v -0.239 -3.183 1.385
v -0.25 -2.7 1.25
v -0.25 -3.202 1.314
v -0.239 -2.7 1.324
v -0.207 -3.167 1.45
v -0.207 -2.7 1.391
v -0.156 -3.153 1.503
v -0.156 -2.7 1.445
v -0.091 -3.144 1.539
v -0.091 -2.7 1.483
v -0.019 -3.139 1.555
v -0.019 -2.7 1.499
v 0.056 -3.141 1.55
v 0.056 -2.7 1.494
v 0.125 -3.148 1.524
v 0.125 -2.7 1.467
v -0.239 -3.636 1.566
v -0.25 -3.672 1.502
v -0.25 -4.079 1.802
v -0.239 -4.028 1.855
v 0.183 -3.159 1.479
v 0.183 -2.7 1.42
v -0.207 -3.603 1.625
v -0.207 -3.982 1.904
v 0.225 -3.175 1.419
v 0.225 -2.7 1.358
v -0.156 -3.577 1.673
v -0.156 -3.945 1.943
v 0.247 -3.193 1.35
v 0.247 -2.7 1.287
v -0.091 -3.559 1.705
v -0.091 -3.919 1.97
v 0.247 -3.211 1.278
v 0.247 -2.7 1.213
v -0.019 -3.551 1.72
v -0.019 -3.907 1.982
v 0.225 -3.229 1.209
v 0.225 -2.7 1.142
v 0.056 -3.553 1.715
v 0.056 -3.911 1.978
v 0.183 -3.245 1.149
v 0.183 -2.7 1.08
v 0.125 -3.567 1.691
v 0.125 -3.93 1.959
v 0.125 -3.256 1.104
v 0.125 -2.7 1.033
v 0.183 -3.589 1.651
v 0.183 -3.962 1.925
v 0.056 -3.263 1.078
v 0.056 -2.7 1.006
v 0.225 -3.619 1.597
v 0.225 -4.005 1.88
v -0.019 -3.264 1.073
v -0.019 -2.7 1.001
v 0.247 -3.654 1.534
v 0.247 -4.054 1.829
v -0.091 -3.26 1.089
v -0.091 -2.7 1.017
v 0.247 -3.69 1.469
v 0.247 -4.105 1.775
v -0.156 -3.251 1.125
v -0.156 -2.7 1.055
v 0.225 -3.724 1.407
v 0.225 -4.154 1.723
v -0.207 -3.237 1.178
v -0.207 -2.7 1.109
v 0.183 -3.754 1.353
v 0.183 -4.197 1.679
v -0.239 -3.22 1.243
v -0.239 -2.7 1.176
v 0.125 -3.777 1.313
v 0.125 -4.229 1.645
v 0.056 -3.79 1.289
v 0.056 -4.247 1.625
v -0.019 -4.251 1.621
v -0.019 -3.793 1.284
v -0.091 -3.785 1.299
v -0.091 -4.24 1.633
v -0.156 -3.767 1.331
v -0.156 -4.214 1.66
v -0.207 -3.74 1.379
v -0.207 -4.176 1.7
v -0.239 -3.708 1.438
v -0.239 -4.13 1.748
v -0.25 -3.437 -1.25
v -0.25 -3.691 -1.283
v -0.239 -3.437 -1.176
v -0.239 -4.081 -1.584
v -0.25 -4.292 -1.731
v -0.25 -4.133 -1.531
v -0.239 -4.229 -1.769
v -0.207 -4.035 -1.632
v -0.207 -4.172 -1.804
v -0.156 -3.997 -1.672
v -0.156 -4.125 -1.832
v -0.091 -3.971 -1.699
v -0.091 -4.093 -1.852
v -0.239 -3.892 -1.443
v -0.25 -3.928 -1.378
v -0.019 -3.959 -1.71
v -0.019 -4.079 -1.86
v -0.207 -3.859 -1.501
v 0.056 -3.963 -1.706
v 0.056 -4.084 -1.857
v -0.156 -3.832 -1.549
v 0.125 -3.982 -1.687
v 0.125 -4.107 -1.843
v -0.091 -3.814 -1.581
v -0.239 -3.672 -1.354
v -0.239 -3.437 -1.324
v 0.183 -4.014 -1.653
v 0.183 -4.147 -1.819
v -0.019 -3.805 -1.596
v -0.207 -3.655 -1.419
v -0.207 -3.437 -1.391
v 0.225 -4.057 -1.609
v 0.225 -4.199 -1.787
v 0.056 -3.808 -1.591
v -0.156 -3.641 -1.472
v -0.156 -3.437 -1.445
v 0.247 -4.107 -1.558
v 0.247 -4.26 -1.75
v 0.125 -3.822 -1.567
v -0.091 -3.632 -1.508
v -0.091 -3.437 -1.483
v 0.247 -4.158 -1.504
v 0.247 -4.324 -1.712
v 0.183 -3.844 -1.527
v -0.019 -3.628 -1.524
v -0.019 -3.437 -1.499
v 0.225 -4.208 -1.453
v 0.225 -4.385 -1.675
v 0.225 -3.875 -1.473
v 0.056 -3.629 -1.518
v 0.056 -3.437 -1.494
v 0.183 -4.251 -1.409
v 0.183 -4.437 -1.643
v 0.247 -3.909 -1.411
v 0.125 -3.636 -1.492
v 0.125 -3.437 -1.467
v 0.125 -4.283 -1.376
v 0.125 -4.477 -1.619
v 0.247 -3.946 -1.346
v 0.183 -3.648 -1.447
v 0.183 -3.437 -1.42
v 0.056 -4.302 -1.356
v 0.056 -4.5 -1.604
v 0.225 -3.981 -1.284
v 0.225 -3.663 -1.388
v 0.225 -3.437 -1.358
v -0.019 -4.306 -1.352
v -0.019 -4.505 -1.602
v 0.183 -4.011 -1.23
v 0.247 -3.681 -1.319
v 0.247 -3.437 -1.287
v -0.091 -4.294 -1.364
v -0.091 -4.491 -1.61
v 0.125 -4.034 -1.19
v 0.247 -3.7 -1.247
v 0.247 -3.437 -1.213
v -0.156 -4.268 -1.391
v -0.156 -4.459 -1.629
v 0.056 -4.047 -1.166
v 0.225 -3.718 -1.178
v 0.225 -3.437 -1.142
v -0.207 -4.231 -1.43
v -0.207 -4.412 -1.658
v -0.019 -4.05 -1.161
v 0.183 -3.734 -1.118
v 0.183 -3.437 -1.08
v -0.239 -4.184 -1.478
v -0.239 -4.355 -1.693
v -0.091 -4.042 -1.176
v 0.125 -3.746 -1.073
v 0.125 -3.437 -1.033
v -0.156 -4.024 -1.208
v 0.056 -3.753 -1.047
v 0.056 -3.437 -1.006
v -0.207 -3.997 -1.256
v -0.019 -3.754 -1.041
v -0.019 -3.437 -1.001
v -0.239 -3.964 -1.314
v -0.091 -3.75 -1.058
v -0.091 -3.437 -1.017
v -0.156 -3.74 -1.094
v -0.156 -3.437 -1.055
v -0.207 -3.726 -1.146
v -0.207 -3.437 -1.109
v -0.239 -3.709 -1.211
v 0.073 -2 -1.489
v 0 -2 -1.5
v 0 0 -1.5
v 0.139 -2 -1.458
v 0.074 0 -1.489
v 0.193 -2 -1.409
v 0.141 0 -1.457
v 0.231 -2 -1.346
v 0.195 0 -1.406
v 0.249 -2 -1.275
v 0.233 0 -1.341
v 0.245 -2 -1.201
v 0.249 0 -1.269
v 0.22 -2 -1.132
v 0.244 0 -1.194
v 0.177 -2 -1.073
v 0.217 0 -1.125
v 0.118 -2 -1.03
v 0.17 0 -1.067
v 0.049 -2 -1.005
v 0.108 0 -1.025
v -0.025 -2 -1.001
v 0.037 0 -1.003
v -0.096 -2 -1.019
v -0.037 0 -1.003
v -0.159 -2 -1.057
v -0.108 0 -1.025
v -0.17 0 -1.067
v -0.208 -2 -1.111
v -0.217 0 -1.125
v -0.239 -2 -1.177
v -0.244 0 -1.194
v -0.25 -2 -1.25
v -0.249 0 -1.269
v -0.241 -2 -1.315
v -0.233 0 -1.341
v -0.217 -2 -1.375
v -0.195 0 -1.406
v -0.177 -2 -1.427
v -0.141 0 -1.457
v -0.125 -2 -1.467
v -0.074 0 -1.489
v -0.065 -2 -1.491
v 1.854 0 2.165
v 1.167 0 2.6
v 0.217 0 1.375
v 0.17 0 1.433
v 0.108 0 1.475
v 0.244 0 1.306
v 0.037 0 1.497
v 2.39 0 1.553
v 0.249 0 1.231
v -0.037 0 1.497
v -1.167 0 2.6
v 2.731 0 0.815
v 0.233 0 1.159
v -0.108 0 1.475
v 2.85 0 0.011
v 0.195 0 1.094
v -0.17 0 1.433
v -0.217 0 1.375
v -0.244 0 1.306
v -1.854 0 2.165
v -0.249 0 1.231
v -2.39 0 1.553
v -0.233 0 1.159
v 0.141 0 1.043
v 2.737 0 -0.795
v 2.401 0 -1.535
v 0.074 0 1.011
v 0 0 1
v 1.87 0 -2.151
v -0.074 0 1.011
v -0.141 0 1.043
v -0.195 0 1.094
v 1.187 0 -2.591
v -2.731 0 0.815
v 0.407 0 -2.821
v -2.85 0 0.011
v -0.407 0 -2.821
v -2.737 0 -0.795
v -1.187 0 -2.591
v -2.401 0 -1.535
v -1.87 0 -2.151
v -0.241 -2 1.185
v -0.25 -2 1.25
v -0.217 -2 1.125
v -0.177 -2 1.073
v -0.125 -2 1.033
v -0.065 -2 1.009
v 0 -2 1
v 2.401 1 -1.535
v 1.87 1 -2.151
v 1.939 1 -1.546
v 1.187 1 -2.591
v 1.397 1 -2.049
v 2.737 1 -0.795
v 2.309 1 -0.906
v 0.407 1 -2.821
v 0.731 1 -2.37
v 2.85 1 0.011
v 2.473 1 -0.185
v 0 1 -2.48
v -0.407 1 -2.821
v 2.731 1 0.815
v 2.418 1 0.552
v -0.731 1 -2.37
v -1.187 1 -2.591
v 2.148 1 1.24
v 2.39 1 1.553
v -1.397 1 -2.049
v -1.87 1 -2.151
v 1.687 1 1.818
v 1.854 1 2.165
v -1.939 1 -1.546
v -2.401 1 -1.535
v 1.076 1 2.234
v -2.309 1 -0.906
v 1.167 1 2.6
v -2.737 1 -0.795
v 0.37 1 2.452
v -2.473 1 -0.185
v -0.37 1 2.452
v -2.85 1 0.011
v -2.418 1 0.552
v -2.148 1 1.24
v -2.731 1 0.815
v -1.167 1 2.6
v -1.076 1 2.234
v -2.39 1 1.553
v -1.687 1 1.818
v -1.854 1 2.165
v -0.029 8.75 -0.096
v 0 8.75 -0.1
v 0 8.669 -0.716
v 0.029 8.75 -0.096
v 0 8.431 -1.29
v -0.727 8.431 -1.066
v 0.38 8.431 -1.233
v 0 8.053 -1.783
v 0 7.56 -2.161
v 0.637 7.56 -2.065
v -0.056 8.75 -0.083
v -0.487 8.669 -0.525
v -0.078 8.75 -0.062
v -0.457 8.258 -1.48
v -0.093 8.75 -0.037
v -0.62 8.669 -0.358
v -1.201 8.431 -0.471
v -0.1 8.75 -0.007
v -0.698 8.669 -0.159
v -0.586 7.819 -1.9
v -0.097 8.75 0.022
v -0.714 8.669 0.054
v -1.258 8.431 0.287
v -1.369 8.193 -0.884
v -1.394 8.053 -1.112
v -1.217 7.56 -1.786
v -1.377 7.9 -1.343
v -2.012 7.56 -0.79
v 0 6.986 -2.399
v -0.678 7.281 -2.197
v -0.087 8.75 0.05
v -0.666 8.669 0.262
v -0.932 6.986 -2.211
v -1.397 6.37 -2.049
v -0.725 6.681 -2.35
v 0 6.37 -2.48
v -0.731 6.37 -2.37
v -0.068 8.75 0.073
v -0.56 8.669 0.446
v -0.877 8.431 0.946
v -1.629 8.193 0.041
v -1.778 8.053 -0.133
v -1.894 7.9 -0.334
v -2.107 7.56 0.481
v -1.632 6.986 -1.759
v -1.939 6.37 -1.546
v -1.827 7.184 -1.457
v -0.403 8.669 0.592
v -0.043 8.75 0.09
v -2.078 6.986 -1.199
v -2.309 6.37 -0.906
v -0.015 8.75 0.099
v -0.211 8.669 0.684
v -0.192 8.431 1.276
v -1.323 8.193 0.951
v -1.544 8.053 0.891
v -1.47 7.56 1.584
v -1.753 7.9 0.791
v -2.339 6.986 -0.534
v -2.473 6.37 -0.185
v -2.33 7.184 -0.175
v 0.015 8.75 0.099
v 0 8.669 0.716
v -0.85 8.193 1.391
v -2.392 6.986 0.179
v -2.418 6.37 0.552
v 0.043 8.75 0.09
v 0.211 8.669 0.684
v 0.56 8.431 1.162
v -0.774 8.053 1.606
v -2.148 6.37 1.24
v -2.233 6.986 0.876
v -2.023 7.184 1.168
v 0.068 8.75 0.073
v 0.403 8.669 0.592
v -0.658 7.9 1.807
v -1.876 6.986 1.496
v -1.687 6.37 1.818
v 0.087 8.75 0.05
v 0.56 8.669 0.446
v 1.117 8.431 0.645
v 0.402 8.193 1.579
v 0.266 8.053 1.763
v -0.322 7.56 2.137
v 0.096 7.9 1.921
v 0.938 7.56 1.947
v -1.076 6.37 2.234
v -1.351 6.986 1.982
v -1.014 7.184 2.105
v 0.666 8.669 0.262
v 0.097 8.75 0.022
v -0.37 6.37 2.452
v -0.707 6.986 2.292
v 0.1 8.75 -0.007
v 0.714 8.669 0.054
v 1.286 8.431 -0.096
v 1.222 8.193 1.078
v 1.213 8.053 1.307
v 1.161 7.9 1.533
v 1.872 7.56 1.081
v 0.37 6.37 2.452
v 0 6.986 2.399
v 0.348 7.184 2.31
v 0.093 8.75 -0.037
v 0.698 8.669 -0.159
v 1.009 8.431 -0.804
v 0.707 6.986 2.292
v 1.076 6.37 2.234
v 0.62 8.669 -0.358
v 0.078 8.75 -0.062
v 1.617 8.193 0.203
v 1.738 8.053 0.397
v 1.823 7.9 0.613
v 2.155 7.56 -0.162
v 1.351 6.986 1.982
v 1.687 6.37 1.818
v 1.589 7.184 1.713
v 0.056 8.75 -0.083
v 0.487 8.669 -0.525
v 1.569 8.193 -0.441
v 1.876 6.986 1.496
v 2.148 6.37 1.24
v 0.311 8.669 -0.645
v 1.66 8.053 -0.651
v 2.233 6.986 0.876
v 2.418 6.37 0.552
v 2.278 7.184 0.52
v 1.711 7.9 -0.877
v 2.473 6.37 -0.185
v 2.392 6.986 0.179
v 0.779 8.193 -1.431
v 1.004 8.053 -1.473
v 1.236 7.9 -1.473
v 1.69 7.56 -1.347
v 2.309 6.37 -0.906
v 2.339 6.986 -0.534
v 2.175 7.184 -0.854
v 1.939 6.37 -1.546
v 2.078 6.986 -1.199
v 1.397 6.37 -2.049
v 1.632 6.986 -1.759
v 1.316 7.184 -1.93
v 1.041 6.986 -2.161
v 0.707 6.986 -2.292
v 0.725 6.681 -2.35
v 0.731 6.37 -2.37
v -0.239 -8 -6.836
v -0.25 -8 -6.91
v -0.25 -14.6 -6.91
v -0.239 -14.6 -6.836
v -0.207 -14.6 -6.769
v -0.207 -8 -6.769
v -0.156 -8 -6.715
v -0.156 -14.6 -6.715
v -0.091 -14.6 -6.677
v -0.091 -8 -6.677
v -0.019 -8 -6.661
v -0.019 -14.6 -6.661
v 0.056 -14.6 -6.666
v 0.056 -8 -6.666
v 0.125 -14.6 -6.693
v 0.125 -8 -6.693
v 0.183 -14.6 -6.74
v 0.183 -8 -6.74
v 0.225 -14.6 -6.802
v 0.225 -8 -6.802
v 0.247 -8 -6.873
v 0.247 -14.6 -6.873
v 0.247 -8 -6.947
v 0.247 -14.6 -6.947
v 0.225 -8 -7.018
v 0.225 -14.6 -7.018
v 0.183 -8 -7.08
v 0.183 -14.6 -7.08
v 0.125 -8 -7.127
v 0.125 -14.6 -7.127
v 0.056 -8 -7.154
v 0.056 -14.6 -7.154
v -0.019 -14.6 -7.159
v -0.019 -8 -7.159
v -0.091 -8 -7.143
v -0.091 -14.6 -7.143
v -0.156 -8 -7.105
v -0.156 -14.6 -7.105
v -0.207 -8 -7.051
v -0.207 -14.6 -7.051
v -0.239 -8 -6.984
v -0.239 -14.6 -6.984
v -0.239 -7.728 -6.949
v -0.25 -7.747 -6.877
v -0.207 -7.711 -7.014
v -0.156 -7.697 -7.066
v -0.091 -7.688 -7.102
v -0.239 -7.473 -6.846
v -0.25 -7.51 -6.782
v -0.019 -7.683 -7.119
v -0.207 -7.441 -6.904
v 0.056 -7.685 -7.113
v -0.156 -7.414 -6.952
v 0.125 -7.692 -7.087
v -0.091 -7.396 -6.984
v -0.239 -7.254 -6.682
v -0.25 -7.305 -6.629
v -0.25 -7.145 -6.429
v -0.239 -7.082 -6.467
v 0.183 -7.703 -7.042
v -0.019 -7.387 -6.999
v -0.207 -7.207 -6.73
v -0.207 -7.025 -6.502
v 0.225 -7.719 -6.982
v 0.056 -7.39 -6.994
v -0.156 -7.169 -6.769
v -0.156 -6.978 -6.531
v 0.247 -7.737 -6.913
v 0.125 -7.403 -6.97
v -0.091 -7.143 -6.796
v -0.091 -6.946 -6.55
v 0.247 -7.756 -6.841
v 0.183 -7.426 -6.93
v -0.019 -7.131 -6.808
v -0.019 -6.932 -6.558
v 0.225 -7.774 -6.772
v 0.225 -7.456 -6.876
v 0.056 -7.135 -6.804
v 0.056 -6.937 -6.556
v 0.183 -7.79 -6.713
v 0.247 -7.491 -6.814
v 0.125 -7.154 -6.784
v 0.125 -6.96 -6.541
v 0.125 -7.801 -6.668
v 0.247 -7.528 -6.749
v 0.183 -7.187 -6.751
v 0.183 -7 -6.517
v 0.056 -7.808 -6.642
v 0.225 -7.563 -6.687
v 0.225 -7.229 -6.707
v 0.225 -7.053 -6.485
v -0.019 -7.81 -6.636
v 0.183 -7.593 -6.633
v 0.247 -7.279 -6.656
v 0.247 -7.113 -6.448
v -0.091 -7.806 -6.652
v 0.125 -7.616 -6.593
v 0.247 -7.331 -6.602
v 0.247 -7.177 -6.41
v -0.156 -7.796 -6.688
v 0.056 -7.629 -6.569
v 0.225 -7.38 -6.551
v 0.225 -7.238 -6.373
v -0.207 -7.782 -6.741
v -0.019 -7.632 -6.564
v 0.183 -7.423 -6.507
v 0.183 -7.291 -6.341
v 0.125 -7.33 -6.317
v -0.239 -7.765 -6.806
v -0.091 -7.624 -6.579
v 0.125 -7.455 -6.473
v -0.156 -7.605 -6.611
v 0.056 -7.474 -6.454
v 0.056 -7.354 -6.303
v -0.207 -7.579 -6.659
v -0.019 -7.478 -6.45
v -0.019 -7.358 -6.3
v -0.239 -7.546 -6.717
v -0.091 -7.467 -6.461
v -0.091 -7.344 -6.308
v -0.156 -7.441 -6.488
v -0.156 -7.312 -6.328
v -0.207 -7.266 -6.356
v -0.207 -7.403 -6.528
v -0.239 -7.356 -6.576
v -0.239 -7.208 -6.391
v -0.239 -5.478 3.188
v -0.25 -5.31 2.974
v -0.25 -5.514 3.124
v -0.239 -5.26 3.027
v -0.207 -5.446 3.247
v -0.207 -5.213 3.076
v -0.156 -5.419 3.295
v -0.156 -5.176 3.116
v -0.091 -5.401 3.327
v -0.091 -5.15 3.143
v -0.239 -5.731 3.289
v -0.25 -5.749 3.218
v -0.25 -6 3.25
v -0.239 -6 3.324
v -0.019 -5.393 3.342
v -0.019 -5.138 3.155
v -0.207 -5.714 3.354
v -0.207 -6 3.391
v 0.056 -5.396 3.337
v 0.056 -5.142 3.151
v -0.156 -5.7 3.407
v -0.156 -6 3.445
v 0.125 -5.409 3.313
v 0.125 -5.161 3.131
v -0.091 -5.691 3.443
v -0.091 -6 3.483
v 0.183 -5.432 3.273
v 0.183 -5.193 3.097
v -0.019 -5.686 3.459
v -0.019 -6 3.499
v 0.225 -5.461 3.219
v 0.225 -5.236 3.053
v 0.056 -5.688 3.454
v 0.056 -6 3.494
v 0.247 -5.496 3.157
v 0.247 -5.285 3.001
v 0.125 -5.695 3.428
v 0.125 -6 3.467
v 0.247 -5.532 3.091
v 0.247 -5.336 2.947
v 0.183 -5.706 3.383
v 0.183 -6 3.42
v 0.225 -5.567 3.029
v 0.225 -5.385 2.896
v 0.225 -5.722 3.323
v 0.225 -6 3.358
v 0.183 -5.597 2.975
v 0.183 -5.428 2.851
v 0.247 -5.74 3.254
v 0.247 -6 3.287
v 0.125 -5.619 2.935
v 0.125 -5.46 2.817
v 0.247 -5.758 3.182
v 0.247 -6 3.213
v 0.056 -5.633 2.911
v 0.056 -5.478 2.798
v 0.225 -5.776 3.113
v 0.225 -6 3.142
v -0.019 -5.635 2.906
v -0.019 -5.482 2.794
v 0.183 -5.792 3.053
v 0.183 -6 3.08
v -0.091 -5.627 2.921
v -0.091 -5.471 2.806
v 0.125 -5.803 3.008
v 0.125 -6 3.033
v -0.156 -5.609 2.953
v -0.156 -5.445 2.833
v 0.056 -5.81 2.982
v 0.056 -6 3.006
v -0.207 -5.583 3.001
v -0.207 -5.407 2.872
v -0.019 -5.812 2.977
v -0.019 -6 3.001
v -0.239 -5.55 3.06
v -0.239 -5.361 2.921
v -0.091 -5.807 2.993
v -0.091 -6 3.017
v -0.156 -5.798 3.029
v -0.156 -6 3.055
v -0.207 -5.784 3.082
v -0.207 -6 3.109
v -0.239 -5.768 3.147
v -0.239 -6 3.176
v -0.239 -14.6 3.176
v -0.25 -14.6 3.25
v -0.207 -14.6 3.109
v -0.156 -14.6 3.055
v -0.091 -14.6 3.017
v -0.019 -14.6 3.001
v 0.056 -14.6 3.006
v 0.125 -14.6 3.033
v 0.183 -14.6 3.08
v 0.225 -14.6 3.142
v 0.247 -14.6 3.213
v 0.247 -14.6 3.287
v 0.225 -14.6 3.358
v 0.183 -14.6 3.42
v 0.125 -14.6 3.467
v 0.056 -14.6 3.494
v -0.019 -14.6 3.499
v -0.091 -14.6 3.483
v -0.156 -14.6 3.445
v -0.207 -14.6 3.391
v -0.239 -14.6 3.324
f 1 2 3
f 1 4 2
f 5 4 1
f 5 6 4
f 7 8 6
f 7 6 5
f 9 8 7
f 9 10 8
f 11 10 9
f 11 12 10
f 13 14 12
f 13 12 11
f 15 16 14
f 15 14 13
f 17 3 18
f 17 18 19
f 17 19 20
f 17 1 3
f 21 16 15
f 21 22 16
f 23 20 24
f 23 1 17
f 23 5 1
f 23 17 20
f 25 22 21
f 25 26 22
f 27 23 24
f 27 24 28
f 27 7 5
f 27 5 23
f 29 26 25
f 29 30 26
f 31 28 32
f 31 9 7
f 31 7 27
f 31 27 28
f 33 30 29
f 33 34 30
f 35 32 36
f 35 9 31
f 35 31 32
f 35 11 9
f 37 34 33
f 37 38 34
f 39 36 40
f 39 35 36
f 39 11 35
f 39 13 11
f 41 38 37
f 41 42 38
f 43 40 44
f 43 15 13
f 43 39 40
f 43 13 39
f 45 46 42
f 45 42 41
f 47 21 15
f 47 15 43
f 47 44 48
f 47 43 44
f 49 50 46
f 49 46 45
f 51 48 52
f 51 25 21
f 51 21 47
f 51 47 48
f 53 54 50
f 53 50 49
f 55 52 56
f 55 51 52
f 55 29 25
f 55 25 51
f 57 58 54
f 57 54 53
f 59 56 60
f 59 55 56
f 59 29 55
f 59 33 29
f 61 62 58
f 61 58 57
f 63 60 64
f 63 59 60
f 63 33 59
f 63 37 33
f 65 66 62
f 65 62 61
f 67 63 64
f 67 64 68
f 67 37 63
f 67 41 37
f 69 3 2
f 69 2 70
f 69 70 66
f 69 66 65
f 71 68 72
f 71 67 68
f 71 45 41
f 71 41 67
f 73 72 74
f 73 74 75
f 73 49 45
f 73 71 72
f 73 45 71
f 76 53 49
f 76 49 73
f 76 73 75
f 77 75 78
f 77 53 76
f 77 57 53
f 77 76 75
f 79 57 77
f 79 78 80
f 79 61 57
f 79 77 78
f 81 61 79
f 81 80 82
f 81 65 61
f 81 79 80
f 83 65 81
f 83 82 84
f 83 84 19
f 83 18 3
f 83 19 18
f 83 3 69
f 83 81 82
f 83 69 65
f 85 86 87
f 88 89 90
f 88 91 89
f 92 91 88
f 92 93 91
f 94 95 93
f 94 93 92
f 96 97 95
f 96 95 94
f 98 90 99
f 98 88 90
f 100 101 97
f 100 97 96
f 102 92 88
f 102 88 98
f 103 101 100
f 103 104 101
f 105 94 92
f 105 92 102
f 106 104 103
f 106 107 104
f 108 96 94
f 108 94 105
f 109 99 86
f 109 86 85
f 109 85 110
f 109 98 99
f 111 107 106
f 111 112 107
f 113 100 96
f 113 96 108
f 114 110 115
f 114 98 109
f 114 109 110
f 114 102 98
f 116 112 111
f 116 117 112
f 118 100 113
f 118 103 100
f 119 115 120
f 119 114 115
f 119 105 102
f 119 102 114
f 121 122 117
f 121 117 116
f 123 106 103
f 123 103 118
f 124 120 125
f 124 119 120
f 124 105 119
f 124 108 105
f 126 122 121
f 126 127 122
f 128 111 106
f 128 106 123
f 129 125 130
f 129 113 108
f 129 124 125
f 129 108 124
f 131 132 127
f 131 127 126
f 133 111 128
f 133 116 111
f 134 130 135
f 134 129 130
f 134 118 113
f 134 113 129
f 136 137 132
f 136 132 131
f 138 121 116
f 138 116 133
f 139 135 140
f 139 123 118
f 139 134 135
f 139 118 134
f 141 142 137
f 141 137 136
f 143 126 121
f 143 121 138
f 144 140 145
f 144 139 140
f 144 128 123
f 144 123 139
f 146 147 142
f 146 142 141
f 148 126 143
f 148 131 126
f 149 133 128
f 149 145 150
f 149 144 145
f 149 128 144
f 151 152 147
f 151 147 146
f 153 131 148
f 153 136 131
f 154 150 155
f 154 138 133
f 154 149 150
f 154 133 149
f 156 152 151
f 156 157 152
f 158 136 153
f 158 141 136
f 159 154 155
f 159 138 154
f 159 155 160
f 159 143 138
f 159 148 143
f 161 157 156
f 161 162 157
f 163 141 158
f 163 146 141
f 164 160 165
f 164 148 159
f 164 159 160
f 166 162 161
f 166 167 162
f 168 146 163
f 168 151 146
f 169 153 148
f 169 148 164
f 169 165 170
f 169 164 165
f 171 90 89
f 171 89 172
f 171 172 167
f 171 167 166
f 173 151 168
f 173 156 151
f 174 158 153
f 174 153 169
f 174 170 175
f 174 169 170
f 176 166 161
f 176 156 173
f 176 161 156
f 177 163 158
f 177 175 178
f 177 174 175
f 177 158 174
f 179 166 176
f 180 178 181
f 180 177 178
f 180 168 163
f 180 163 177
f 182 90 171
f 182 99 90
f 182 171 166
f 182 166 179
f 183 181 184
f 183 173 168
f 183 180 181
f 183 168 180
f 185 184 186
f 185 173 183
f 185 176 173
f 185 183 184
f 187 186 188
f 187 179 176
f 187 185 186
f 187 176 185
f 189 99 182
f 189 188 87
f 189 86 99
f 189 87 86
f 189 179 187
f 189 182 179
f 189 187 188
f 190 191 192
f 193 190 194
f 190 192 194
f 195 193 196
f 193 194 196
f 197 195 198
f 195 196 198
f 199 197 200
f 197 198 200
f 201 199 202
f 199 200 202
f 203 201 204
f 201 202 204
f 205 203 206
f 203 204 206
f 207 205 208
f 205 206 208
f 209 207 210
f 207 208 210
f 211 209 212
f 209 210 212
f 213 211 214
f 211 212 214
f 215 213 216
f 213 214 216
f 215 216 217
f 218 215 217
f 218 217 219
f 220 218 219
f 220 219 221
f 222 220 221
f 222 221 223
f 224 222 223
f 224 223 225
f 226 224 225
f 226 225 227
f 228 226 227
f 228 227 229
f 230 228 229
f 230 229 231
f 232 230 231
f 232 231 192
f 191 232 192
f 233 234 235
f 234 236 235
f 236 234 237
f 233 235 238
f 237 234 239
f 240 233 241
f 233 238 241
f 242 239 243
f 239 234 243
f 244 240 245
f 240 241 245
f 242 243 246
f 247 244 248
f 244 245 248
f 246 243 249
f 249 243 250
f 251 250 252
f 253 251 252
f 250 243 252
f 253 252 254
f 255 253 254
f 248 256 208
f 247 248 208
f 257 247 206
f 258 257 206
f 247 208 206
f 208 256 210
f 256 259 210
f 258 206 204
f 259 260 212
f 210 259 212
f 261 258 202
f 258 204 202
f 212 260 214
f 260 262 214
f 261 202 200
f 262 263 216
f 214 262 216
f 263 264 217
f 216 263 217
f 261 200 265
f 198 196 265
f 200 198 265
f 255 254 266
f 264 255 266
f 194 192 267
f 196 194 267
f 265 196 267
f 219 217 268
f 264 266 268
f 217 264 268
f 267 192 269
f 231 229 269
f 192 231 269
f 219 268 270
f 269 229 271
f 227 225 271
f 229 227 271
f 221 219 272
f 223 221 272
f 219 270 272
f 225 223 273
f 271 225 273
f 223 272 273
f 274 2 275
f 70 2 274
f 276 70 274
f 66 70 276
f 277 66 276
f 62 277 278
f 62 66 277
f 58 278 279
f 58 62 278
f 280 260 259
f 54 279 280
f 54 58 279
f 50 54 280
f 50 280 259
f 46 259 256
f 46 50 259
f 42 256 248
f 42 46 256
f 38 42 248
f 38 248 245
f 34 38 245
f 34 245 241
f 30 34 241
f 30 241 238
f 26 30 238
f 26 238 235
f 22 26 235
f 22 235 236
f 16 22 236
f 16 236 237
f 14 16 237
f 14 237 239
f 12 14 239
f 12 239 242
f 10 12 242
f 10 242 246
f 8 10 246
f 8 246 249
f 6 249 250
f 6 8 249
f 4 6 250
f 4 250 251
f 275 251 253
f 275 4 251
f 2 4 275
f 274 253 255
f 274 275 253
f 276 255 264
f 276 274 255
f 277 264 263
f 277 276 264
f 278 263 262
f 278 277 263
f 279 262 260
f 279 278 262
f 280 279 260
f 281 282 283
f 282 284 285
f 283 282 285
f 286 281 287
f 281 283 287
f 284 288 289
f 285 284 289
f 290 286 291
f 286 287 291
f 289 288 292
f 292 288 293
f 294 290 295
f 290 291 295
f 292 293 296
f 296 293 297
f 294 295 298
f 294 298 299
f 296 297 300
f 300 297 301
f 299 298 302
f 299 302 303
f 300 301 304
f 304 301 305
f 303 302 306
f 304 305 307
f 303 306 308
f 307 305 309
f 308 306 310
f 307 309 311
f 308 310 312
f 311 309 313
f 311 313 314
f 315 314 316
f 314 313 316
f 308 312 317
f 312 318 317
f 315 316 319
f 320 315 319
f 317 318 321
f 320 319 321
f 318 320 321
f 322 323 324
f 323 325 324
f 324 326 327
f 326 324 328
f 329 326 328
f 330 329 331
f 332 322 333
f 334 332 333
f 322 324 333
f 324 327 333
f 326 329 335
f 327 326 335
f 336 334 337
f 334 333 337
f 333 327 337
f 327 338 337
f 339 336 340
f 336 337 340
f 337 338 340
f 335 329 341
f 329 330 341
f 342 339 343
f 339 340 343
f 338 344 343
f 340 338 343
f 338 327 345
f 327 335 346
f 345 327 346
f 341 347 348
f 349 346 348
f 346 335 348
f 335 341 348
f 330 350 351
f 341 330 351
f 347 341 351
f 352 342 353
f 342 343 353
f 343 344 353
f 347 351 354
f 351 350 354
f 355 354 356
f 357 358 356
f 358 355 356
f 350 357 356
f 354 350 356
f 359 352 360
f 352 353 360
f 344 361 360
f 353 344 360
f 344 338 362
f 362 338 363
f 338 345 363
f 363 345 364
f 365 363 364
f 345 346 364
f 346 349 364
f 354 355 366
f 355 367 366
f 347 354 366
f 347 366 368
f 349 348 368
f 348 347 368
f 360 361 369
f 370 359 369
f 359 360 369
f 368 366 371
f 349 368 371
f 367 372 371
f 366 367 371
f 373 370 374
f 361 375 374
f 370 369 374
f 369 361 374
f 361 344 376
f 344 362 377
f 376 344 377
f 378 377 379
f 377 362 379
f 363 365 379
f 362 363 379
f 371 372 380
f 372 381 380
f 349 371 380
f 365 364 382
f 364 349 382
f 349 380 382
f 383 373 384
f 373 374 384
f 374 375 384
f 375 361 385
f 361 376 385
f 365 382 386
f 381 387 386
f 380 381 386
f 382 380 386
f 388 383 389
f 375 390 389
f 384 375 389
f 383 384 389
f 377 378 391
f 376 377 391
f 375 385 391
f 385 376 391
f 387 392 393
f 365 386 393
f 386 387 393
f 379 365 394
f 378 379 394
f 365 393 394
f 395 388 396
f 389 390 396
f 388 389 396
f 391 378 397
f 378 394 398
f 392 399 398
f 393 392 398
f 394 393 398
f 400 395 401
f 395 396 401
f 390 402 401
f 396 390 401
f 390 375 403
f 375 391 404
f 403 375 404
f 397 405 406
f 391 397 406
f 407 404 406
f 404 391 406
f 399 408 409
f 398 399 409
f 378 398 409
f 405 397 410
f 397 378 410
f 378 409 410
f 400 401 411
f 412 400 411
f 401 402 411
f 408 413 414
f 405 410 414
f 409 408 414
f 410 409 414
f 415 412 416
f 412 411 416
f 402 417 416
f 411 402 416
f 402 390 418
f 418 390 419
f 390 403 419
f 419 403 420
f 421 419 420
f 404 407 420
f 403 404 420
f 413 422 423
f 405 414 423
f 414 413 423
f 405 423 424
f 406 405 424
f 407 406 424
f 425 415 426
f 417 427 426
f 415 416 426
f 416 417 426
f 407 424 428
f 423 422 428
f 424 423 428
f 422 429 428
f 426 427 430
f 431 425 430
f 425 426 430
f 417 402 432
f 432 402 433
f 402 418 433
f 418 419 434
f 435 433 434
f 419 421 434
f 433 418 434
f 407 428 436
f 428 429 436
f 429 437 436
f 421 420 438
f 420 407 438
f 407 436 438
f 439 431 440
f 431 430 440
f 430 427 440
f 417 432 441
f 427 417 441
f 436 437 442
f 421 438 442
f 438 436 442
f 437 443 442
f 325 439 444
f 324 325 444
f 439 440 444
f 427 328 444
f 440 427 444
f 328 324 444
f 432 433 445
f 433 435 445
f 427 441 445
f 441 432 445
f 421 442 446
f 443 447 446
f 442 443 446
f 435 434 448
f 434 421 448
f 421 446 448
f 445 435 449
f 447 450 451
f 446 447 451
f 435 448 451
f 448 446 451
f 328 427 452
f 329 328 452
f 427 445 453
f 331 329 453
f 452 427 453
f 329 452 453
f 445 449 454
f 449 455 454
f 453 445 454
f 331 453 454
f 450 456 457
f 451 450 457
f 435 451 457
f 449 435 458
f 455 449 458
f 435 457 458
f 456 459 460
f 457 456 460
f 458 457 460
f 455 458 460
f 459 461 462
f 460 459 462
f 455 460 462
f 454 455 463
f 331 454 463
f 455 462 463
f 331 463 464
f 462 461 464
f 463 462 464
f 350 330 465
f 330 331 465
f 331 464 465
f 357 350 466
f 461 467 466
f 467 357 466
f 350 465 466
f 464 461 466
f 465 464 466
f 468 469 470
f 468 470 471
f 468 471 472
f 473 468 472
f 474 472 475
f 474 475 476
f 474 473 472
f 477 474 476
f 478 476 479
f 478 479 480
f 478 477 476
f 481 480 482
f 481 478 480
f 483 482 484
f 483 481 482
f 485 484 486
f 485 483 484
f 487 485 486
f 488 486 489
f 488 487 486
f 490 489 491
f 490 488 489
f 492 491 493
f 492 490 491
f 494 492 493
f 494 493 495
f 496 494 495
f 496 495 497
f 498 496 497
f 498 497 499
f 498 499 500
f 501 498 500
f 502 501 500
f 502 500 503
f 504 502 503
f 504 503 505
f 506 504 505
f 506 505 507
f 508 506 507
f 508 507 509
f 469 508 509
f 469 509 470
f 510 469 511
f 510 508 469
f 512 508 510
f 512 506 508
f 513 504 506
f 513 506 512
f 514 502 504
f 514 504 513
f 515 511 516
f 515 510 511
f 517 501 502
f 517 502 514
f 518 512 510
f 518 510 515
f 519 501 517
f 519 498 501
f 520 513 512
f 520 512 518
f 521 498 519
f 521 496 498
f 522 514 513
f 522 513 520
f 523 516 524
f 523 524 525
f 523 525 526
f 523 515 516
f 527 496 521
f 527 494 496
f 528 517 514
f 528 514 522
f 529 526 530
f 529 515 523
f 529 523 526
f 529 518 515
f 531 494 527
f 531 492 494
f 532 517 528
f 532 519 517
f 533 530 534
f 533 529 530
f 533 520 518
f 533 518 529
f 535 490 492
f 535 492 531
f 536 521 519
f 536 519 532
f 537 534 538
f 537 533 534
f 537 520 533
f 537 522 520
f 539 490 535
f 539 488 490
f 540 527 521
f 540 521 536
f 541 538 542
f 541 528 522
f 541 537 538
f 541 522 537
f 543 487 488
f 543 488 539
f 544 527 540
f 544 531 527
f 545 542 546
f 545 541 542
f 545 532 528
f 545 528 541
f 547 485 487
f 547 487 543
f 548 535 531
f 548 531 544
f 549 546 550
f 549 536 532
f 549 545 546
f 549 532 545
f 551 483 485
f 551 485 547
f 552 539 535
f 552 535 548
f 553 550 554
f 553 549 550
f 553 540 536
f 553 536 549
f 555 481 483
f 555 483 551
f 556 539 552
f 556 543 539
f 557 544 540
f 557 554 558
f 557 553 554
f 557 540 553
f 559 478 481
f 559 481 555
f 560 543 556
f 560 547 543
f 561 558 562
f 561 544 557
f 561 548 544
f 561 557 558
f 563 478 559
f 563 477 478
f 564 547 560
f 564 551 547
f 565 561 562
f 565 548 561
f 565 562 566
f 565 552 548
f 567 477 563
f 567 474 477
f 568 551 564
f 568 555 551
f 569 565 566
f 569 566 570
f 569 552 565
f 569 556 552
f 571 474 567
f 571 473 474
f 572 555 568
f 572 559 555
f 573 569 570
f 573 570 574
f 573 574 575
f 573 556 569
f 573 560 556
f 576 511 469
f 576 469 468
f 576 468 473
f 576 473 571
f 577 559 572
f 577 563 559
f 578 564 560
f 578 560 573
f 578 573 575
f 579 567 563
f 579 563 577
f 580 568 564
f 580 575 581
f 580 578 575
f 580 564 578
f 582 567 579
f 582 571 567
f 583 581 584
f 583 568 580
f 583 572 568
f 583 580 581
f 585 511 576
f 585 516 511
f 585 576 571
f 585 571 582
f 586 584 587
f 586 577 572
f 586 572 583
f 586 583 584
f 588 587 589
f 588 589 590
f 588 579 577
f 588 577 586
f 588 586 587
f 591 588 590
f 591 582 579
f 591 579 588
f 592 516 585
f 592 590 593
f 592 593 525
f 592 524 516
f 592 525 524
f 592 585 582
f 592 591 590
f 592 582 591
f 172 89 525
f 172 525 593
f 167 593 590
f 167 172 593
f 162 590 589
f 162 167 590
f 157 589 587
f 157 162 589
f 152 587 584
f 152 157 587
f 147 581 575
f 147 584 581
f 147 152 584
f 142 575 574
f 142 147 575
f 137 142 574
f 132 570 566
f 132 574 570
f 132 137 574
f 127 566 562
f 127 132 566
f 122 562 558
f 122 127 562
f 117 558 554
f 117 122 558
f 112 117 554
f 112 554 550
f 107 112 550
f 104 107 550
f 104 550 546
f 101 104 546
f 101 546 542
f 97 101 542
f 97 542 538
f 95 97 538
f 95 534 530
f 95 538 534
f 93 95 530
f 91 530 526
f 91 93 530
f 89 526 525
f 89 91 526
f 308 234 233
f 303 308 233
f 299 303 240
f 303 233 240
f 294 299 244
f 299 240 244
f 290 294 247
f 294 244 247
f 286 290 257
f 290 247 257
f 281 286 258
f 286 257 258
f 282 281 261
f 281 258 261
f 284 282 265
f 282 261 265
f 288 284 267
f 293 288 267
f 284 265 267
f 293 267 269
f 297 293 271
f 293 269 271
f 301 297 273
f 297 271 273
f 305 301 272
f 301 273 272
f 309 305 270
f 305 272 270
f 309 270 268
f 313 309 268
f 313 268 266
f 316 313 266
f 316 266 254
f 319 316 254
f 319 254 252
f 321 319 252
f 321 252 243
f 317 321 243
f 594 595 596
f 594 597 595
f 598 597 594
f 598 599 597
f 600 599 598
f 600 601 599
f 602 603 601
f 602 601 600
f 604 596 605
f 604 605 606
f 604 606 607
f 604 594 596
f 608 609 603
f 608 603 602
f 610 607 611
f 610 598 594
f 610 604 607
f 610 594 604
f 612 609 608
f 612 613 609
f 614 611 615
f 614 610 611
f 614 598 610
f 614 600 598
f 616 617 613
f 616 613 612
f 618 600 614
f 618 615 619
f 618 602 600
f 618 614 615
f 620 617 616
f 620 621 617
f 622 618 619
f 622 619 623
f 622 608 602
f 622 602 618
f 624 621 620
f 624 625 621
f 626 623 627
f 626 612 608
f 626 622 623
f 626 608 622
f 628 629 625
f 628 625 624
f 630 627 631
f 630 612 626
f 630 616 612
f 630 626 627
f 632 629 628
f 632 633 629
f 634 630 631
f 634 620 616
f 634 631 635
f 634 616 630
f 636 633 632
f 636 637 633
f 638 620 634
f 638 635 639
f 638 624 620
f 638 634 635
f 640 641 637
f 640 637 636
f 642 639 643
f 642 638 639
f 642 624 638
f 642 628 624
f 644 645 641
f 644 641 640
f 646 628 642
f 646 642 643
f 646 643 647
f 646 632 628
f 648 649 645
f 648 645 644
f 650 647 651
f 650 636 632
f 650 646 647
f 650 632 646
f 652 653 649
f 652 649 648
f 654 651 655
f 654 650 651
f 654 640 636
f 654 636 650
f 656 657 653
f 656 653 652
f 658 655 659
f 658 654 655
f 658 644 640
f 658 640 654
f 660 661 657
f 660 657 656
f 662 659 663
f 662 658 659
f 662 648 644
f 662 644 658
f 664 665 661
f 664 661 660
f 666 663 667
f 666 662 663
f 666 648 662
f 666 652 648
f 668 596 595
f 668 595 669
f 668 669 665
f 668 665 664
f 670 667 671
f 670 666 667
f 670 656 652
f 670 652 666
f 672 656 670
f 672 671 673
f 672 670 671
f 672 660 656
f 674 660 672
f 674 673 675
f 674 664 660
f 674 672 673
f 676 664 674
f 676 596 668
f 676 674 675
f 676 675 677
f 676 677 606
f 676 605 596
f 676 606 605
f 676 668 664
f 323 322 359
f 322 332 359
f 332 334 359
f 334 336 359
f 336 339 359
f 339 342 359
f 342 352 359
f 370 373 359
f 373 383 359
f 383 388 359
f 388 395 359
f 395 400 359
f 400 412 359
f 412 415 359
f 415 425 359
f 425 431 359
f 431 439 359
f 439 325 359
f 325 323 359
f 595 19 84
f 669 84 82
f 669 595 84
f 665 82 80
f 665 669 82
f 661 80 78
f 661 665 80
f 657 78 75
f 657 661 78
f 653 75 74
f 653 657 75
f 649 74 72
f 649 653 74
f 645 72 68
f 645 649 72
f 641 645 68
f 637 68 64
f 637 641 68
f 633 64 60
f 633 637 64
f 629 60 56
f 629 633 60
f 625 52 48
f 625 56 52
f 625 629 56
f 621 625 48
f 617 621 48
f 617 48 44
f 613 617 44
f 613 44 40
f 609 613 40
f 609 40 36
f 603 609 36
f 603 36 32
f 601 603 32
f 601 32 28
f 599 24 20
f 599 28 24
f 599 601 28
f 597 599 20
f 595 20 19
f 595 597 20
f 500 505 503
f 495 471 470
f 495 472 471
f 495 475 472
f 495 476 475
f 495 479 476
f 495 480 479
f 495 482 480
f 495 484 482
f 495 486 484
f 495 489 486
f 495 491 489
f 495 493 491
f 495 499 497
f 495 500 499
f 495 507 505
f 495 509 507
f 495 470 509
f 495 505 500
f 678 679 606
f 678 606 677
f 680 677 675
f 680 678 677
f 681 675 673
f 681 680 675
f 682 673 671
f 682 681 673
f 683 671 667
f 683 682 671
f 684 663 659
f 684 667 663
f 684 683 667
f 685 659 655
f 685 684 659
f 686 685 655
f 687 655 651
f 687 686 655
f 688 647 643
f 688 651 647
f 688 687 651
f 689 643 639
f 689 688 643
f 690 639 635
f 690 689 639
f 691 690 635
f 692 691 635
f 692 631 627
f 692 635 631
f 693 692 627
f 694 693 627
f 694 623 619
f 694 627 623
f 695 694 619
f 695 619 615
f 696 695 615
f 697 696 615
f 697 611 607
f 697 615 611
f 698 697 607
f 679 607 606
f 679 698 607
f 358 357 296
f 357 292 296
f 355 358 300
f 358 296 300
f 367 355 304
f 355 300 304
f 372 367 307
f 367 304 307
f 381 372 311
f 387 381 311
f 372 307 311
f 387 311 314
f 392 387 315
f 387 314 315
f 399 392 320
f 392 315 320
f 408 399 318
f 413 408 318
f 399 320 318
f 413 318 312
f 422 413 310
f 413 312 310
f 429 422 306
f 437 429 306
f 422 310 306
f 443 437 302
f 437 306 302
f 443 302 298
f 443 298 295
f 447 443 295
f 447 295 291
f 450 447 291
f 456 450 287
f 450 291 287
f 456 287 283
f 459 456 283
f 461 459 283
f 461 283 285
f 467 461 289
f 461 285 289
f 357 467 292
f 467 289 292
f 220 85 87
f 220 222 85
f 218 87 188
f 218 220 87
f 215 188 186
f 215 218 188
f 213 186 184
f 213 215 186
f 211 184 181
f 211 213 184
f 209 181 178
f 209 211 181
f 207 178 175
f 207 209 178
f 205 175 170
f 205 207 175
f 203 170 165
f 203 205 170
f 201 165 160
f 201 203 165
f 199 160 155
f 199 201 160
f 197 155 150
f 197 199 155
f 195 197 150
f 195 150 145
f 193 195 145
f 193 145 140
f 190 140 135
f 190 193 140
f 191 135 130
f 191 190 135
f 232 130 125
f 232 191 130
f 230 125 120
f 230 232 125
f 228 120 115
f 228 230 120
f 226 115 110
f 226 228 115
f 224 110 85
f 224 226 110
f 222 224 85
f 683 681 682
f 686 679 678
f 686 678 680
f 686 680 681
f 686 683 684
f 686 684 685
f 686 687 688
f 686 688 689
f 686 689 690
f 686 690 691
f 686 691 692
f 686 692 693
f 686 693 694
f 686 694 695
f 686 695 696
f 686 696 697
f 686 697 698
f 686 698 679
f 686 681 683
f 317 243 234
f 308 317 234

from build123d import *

# Parameters (mm, degrees)
CUT_EXTRUDE1_DEPTH  = 1
SKETCH3_R           = 0.25
BOSS_EXTRUDE1_DEPTH = 2
SKETCH5_R           = 0.25
SKETCH7_R           = 0.25


with BuildPart() as part:
    # Sketch1 → Revolve1 (revolve)
    with BuildSketch(Plane.XY, mode=Mode.PRIVATE) as revolve1_sk:
        with BuildLine():
            Line((0, 0), (0, 8.75))
            Line((0, 8.75), (0.1, 8.75))
            ThreePointArc((0.1, 8.75), (1.782914139, 8.052914139), (2.48, 6.37))
            Line((2.48, 6.37), (2.48, 1))
            Line((2.48, 1), (2.85, 1))
            Line((2.85, 1), (2.85, 0))
            Line((2.85, 0), (0, 0))
        make_face()
    revolve(revolve1_sk.sketch.rotate(Axis((0, 0, 0), (0, 1, 0)), 90), axis=Axis((0, 0, 0), (0, 1, 0)))

    # Sketch2 → Cut-Extrude1 (cut)
    with BuildSketch(Plane.XZ):
        with BuildLine():
            Line((-1.167261753, 2.6), (1.167261753, 2.6))
            ThreePointArc((1.167261753, 2.6), (0, 2.85), (-1.167261753, 2.6))
        make_face()
    extrude(amount=-CUT_EXTRUDE1_DEPTH, mode=Mode.SUBTRACT)

    # Sketch3 → Boss-Extrude1 (add)
    with BuildSketch(Plane.XZ):
        with Locations(Location((0, -1.25, 0), (0, 0, 270))):
            Circle(SKETCH3_R)
        with Locations(Location((0, 1.25, 0), (0, 0, 270))):
            Circle(SKETCH3_R)
    extrude(amount=BOSS_EXTRUDE1_DEPTH)

    # Sweep1: sweep along a path in Sketch4
    with BuildLine(Plane(origin=(0, 0, 0), x_dir=(0, 0, -1), z_dir=(1, 0, 0))) as sweep1_path:
        Line((-1.25, -2), (-1.25, -2.7))
        ThreePointArc((-1.25, -2.7), (-1.393046618, -3.442781353), (-1.801724138, -4.079310345))
        Line((-1.801724138, -4.079310345), (-2.974137931, -5.310344828))
        ThreePointArc((-2.974137931, -5.310344828), (-3.178476691, -5.628609324), (-3.25, -6))
        Line((-3.25, -6), (-3.25, -14.6))
    # Sketch5 → Sweep1 (sweep)
    with BuildSketch(Plane(origin=(0, -14.6, 3.25), x_dir=(-1, 0, 0), z_dir=(0, -1, 0))):
        Circle(SKETCH5_R)
    sweep(path=sweep1_path.line)

    # Sweep2: sweep along a path in Sketch6
    with BuildLine(Plane(origin=(0, 0, 0), x_dir=(0, 0, -1), z_dir=(1, 0, 0))) as sweep2_path:
        Line((6.91, -14.6), (6.91, -8))
        ThreePointArc((6.91, -8), (6.78151551, -7.50963206), (6.429078567, -7.14527347))
        Line((6.429078567, -7.14527347), (1.730921433, -4.292065356))
        ThreePointArc((1.730921433, -4.292065356), (1.37848449, -3.927706766), (1.25, -3.437338826))
        Line((1.25, -3.437338826), (1.25, -2))
    # Sketch7 → Sweep2 (sweep)
    with BuildSketch(Plane(origin=(0, -14.6, -6.91), x_dir=(-1, 0, 0), z_dir=(0, -1, 0))):
        Circle(SKETCH7_R)
    sweep(path=sweep2_path.line)


solid = part.part
